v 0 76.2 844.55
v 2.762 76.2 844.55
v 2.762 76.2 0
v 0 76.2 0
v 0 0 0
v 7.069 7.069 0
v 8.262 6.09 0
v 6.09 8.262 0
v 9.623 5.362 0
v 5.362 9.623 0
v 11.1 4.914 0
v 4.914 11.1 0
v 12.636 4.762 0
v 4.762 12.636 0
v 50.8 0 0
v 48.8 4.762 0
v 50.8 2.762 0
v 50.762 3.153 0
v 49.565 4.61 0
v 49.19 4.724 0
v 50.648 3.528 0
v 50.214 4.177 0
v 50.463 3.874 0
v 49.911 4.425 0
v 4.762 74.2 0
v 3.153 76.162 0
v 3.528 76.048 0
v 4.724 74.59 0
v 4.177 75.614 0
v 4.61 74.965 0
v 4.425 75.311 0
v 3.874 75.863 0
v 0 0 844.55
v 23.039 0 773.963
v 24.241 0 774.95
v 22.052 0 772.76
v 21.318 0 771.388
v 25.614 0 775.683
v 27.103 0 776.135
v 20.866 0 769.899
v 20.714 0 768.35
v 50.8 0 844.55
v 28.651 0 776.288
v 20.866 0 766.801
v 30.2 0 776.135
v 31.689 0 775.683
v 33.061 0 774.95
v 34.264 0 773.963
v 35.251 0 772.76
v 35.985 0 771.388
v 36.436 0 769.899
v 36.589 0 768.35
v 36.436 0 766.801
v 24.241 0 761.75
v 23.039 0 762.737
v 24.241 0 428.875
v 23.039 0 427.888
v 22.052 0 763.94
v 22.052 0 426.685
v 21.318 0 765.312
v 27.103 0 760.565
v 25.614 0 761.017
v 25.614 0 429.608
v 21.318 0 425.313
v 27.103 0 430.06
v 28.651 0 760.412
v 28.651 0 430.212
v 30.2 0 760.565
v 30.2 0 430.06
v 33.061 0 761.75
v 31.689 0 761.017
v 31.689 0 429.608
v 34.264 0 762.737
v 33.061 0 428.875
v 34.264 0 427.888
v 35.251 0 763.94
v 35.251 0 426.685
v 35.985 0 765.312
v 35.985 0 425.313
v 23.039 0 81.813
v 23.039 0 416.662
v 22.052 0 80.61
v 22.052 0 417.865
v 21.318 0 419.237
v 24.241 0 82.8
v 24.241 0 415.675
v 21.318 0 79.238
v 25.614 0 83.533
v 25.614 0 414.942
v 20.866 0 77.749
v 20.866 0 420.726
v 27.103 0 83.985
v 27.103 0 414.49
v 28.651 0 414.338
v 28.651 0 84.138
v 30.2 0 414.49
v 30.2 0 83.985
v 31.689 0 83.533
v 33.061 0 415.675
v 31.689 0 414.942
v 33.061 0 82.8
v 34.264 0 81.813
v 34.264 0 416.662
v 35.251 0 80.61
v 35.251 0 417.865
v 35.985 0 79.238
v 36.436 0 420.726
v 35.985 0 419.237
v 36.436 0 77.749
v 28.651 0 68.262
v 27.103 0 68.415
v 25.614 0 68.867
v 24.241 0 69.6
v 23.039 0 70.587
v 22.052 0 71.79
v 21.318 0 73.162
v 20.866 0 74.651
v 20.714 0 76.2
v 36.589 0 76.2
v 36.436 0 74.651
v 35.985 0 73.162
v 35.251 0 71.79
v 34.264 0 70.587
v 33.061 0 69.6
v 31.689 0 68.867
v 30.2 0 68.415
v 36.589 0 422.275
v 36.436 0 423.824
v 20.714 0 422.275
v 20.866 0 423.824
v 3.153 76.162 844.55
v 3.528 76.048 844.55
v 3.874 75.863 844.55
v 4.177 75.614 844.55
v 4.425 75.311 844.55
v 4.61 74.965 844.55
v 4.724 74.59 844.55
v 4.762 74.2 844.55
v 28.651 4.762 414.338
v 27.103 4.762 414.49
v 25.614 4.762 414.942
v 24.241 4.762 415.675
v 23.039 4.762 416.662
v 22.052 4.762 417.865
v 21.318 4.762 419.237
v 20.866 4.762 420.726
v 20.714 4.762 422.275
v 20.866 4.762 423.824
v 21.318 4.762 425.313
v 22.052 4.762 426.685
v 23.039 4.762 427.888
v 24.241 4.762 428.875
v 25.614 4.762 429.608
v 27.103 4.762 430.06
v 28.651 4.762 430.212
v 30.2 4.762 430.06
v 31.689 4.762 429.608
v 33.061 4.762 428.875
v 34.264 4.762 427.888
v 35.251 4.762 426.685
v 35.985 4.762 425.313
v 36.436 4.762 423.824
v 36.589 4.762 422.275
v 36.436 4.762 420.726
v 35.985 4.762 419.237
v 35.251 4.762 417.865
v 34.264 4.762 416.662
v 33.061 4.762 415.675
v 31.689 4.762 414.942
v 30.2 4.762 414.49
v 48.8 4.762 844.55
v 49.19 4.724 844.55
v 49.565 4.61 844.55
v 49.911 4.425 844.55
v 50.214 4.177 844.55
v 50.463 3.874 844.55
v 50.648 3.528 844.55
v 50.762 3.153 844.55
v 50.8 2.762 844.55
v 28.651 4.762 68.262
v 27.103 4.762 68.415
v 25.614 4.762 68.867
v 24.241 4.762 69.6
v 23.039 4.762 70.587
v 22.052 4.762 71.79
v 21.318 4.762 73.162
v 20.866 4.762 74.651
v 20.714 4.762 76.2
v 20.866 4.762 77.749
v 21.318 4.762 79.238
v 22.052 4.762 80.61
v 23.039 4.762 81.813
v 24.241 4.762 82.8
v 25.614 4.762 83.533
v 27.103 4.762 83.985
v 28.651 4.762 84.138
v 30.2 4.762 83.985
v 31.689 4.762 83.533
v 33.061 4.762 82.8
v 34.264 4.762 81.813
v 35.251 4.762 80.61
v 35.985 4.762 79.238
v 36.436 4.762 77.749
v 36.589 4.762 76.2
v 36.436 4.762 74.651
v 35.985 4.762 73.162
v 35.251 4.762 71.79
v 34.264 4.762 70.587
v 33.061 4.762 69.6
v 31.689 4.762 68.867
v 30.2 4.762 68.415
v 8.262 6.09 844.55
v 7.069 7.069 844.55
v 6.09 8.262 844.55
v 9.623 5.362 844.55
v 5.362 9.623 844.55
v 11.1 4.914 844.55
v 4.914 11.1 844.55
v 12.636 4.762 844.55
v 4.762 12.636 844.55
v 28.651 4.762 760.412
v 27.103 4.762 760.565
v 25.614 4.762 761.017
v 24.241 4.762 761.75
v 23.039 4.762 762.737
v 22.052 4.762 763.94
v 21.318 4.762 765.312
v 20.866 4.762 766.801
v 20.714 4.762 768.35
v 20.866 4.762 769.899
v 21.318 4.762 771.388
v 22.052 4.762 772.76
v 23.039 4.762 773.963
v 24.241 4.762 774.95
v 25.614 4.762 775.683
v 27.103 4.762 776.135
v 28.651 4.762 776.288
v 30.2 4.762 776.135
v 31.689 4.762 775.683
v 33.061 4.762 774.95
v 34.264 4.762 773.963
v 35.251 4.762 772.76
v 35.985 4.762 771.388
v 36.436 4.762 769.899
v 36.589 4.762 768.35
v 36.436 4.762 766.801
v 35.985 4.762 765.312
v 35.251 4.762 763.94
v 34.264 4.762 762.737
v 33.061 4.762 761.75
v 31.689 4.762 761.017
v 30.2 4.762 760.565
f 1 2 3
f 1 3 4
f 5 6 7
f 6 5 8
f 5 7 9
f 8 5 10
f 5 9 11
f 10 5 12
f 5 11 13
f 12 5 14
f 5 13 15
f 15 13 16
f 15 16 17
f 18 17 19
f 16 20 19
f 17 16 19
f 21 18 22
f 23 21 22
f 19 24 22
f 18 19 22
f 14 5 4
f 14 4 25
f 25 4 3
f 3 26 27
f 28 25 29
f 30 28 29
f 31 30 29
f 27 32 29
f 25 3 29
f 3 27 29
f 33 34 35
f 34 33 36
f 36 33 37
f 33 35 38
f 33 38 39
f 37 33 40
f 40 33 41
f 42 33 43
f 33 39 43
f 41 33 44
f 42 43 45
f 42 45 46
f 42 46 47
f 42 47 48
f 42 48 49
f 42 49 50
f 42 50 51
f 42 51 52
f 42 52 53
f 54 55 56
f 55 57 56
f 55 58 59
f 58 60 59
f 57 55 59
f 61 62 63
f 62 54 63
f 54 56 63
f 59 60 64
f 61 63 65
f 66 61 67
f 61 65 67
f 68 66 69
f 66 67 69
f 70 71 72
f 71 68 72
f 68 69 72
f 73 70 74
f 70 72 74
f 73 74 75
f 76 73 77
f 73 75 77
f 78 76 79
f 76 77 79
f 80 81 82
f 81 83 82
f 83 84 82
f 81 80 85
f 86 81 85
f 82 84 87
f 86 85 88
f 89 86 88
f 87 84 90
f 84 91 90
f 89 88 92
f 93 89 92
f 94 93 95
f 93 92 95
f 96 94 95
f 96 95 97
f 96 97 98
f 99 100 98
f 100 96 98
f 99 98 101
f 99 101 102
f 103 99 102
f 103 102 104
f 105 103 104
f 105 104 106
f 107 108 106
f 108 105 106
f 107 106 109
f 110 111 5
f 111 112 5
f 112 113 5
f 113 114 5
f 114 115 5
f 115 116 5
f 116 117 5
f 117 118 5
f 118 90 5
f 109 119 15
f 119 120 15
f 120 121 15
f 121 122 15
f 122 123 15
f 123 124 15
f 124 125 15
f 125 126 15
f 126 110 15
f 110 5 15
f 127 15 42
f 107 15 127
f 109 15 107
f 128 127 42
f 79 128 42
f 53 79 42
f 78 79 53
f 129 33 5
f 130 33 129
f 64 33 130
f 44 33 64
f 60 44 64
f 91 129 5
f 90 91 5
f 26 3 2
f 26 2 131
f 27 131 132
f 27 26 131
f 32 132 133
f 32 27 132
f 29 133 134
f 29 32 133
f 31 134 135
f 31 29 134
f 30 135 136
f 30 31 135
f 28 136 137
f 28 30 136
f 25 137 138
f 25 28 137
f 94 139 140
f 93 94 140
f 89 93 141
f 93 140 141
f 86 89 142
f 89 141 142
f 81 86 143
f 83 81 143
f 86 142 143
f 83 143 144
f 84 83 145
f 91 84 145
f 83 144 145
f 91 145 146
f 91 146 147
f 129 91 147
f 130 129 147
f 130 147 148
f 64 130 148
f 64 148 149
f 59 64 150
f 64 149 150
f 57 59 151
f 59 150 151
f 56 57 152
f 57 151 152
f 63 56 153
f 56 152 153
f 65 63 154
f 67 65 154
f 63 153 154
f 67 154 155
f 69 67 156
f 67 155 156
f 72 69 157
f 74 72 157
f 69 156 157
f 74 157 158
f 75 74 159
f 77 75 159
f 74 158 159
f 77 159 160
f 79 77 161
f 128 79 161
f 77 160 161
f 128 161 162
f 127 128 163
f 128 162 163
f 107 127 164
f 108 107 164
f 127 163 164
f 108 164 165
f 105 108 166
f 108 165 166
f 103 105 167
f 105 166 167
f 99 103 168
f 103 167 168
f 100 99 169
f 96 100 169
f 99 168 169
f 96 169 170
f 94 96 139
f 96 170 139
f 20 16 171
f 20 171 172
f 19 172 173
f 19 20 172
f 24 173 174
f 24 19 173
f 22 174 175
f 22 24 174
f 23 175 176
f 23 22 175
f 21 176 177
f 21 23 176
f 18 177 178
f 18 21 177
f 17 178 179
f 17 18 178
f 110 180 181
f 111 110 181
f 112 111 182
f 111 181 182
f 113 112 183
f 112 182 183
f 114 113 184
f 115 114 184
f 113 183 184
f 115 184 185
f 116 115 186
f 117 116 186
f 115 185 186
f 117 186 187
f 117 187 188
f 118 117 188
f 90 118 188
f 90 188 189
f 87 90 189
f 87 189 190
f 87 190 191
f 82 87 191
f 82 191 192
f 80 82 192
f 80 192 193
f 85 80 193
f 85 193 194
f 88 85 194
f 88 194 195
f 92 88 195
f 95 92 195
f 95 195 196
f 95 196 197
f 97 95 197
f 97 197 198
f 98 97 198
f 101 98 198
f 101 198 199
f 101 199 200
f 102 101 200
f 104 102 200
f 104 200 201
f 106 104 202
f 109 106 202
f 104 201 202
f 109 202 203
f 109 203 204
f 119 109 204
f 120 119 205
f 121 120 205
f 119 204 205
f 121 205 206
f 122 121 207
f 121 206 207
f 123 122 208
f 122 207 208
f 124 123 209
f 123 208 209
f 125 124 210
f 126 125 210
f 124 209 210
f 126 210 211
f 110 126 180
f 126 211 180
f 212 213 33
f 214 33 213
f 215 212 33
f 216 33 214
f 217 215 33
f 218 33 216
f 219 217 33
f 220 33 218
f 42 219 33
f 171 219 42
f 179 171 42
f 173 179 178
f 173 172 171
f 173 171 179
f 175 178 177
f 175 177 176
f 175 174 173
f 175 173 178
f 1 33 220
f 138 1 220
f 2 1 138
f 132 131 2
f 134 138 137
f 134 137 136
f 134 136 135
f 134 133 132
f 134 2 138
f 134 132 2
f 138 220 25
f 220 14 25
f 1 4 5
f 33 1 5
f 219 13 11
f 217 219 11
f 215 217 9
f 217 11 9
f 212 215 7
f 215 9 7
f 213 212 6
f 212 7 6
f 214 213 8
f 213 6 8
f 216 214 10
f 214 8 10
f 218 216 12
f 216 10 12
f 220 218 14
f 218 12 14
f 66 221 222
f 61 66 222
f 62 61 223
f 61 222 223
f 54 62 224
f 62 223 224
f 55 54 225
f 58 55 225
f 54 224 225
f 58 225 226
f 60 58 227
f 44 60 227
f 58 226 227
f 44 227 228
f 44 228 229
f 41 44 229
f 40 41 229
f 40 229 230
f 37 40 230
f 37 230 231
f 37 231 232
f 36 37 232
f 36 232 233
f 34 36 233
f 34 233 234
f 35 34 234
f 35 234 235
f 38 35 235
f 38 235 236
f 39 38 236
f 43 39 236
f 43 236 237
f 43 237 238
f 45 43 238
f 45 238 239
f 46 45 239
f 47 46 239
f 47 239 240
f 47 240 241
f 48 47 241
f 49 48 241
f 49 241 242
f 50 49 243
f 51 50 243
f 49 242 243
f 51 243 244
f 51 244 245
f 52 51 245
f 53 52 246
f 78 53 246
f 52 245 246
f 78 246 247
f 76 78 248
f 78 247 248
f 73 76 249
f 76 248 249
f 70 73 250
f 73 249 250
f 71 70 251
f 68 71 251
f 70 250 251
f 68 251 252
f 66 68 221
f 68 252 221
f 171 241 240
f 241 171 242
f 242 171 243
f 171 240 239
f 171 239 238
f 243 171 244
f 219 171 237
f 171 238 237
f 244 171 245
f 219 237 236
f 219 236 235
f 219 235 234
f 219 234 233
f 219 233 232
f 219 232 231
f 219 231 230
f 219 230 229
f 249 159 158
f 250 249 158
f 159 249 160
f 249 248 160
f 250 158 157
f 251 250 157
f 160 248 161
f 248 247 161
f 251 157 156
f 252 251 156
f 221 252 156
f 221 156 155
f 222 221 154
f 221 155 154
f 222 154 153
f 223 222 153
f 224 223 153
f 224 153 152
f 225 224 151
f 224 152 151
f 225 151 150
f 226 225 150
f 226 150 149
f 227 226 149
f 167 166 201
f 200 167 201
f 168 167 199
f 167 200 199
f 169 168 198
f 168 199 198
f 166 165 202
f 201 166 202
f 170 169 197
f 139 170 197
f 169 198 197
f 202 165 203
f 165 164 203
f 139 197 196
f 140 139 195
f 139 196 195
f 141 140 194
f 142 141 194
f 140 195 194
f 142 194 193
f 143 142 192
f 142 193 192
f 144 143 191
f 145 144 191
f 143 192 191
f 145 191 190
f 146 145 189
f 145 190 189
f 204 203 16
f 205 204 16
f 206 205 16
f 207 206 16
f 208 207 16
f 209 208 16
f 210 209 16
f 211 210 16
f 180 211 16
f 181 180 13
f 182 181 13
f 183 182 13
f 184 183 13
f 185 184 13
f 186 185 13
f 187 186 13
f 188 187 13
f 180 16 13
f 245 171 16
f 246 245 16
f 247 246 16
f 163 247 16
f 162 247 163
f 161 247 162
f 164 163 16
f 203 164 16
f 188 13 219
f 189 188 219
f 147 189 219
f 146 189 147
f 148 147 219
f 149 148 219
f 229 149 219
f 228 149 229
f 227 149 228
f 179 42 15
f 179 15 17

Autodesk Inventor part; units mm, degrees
ref_plane "YZ Plane" through (0, 0, 0) normal (1, 0, 0) x (0, 1, 0)
ref_plane "Start plane" through (0, 0, 0) normal (0, 0, 1) x (1, 0, 0)
ref_plane "End plane" through (0, 0, 844.55) normal (0, 0, 1) x (1, 0, 0)
sketch "Sketch" plane through (0, 0, 0) normal (0, 0, 1) x (1, 0, 0)
  line L0 (0, 76.2) -> (0, 0)
  line L1 (0, 0) -> (50.8, 0)
  line L2 (50.8, 0) -> (50.8, 2.7625)
  line L3 (48.8, 4.7625) -> (12.6365, 4.7625)
  line L4 (4.7625, 12.6365) -> (4.7625, 74.2)
  line L5 (2.7625, 76.2) -> (0, 76.2)
  line L6 (-7.0414, 0) -> (21.5385, 0) construction
  line L7 (0, -8.0414) -> (0, 34.5385) construction
  arc A0 (4.7625, 12.6365) -> (12.6365, 4.7625) centre (12.6365, 12.6365) ccw
  arc A1 (50.8, 2.7625) -> (48.8, 4.7625) centre (48.8, 2.7625) ccw
  arc A2 (4.7625, 74.2) -> (2.7625, 76.2) centre (2.7625, 74.2) ccw
  line L8 (0, 93.5453) -> (0, -24.9725) construction
  line L9 (-18.6925, 0) -> (62.8653, 0) construction
  point P0 (50.8, 4.7625)
  point P1 (4.7625, 4.7625)
  point P2 (4.7625, 76.2)
  dimension "d12" = 4.7625
  dimension "d13" = 76.2
  dimension "d14" = 50.8
  dimension "d15" = 0
  dimension "d16" = 4.7625
  dimension "d17" = 0
  dimension "d18" = 7.874
  dimension "d19" = 2
extrude "Body" add sketch "Sketch" along normal up to surface (844.55 mm away) from surface at 0
sketch "Sketch4" plane through (0, 0, 0) normal (0, 0, 1) x (1, 0, 0)
  line L0 (0, 0) -> (10, 0)
ref_plane "Work Plane3" through (0, 0, 0) normal (0, -1, 0) x (1, 0, 0)
sketch "Sketch5" plane through (0, 0, 0) normal (0, -1, 0) x (1, 0, 0)
  line L0 (-2, 0) -> (12, 0)
  line L1 (-2, 844.55) -> (12, 844.55)
  dimension "d37" = 844.55
sketch "Sketch3" plane through (0, 0, 0) normal (0, -1, 0) x (1, 0, 0)
  line L0 (50.8, 844.55) -> (0, 844.55) projected
  line L1 (50.8, 0) -> (50.8, 844.55) projected
  line L2 (28.6513, 844.55) -> (28.6513, 0)
  point P0 (28.6513, 422.275)
  point P1 (50.8, 422.275)
  point P2 (28.6513, 768.35)
  point P3 (28.6513, 76.2)
  point P4 (28.6513, 422.275)
  dimension "d22" = 844.55
  dimension "d23" = 76.2
  dimension "d24" = 422.275
  dimension "d25" = 768.35
  dimension "d26" = 76.2
  dimension "d27" = 422.275
  dimension "d28" = 768.35
hole "Hole1" at (28.6513, 0, 768.35) at (28.6513, 0, 76.2) at (28.6513, 0, 422.275) direction (0, 1, 0) diameter 15.875 end through all
equation "\"d12\" = G_T"
equation "\"d13\" = G_H"
equation "\"d14\" = G_W"
equation "\"d16\" = G_T"
equation "\"d18\" = G_IR"
equation "\"d4\" = G_L"
equation "\"G_W\" = 50.8"
equation "\"G_H\" = 76.2"
equation "\"G_T\" = 4.7625"
equation "\"G_ER\" = 4.064"
equation "\"G_IR\" = 7.874"
equation "\"G_L\" = d37"
equation "\"ex\" = 0"
equation "\"ey\" = 0"
equation "\"G_OFFSET_START\" = 0"
equation "\"G_OFFSET_END\" = 0"
equation "\"d21\" = G_OFFSET_END + B_L"
equation "\"B_L\" = 844.55"
properties part number "ANSI L 3 x 2 x 3_16 00000005"
